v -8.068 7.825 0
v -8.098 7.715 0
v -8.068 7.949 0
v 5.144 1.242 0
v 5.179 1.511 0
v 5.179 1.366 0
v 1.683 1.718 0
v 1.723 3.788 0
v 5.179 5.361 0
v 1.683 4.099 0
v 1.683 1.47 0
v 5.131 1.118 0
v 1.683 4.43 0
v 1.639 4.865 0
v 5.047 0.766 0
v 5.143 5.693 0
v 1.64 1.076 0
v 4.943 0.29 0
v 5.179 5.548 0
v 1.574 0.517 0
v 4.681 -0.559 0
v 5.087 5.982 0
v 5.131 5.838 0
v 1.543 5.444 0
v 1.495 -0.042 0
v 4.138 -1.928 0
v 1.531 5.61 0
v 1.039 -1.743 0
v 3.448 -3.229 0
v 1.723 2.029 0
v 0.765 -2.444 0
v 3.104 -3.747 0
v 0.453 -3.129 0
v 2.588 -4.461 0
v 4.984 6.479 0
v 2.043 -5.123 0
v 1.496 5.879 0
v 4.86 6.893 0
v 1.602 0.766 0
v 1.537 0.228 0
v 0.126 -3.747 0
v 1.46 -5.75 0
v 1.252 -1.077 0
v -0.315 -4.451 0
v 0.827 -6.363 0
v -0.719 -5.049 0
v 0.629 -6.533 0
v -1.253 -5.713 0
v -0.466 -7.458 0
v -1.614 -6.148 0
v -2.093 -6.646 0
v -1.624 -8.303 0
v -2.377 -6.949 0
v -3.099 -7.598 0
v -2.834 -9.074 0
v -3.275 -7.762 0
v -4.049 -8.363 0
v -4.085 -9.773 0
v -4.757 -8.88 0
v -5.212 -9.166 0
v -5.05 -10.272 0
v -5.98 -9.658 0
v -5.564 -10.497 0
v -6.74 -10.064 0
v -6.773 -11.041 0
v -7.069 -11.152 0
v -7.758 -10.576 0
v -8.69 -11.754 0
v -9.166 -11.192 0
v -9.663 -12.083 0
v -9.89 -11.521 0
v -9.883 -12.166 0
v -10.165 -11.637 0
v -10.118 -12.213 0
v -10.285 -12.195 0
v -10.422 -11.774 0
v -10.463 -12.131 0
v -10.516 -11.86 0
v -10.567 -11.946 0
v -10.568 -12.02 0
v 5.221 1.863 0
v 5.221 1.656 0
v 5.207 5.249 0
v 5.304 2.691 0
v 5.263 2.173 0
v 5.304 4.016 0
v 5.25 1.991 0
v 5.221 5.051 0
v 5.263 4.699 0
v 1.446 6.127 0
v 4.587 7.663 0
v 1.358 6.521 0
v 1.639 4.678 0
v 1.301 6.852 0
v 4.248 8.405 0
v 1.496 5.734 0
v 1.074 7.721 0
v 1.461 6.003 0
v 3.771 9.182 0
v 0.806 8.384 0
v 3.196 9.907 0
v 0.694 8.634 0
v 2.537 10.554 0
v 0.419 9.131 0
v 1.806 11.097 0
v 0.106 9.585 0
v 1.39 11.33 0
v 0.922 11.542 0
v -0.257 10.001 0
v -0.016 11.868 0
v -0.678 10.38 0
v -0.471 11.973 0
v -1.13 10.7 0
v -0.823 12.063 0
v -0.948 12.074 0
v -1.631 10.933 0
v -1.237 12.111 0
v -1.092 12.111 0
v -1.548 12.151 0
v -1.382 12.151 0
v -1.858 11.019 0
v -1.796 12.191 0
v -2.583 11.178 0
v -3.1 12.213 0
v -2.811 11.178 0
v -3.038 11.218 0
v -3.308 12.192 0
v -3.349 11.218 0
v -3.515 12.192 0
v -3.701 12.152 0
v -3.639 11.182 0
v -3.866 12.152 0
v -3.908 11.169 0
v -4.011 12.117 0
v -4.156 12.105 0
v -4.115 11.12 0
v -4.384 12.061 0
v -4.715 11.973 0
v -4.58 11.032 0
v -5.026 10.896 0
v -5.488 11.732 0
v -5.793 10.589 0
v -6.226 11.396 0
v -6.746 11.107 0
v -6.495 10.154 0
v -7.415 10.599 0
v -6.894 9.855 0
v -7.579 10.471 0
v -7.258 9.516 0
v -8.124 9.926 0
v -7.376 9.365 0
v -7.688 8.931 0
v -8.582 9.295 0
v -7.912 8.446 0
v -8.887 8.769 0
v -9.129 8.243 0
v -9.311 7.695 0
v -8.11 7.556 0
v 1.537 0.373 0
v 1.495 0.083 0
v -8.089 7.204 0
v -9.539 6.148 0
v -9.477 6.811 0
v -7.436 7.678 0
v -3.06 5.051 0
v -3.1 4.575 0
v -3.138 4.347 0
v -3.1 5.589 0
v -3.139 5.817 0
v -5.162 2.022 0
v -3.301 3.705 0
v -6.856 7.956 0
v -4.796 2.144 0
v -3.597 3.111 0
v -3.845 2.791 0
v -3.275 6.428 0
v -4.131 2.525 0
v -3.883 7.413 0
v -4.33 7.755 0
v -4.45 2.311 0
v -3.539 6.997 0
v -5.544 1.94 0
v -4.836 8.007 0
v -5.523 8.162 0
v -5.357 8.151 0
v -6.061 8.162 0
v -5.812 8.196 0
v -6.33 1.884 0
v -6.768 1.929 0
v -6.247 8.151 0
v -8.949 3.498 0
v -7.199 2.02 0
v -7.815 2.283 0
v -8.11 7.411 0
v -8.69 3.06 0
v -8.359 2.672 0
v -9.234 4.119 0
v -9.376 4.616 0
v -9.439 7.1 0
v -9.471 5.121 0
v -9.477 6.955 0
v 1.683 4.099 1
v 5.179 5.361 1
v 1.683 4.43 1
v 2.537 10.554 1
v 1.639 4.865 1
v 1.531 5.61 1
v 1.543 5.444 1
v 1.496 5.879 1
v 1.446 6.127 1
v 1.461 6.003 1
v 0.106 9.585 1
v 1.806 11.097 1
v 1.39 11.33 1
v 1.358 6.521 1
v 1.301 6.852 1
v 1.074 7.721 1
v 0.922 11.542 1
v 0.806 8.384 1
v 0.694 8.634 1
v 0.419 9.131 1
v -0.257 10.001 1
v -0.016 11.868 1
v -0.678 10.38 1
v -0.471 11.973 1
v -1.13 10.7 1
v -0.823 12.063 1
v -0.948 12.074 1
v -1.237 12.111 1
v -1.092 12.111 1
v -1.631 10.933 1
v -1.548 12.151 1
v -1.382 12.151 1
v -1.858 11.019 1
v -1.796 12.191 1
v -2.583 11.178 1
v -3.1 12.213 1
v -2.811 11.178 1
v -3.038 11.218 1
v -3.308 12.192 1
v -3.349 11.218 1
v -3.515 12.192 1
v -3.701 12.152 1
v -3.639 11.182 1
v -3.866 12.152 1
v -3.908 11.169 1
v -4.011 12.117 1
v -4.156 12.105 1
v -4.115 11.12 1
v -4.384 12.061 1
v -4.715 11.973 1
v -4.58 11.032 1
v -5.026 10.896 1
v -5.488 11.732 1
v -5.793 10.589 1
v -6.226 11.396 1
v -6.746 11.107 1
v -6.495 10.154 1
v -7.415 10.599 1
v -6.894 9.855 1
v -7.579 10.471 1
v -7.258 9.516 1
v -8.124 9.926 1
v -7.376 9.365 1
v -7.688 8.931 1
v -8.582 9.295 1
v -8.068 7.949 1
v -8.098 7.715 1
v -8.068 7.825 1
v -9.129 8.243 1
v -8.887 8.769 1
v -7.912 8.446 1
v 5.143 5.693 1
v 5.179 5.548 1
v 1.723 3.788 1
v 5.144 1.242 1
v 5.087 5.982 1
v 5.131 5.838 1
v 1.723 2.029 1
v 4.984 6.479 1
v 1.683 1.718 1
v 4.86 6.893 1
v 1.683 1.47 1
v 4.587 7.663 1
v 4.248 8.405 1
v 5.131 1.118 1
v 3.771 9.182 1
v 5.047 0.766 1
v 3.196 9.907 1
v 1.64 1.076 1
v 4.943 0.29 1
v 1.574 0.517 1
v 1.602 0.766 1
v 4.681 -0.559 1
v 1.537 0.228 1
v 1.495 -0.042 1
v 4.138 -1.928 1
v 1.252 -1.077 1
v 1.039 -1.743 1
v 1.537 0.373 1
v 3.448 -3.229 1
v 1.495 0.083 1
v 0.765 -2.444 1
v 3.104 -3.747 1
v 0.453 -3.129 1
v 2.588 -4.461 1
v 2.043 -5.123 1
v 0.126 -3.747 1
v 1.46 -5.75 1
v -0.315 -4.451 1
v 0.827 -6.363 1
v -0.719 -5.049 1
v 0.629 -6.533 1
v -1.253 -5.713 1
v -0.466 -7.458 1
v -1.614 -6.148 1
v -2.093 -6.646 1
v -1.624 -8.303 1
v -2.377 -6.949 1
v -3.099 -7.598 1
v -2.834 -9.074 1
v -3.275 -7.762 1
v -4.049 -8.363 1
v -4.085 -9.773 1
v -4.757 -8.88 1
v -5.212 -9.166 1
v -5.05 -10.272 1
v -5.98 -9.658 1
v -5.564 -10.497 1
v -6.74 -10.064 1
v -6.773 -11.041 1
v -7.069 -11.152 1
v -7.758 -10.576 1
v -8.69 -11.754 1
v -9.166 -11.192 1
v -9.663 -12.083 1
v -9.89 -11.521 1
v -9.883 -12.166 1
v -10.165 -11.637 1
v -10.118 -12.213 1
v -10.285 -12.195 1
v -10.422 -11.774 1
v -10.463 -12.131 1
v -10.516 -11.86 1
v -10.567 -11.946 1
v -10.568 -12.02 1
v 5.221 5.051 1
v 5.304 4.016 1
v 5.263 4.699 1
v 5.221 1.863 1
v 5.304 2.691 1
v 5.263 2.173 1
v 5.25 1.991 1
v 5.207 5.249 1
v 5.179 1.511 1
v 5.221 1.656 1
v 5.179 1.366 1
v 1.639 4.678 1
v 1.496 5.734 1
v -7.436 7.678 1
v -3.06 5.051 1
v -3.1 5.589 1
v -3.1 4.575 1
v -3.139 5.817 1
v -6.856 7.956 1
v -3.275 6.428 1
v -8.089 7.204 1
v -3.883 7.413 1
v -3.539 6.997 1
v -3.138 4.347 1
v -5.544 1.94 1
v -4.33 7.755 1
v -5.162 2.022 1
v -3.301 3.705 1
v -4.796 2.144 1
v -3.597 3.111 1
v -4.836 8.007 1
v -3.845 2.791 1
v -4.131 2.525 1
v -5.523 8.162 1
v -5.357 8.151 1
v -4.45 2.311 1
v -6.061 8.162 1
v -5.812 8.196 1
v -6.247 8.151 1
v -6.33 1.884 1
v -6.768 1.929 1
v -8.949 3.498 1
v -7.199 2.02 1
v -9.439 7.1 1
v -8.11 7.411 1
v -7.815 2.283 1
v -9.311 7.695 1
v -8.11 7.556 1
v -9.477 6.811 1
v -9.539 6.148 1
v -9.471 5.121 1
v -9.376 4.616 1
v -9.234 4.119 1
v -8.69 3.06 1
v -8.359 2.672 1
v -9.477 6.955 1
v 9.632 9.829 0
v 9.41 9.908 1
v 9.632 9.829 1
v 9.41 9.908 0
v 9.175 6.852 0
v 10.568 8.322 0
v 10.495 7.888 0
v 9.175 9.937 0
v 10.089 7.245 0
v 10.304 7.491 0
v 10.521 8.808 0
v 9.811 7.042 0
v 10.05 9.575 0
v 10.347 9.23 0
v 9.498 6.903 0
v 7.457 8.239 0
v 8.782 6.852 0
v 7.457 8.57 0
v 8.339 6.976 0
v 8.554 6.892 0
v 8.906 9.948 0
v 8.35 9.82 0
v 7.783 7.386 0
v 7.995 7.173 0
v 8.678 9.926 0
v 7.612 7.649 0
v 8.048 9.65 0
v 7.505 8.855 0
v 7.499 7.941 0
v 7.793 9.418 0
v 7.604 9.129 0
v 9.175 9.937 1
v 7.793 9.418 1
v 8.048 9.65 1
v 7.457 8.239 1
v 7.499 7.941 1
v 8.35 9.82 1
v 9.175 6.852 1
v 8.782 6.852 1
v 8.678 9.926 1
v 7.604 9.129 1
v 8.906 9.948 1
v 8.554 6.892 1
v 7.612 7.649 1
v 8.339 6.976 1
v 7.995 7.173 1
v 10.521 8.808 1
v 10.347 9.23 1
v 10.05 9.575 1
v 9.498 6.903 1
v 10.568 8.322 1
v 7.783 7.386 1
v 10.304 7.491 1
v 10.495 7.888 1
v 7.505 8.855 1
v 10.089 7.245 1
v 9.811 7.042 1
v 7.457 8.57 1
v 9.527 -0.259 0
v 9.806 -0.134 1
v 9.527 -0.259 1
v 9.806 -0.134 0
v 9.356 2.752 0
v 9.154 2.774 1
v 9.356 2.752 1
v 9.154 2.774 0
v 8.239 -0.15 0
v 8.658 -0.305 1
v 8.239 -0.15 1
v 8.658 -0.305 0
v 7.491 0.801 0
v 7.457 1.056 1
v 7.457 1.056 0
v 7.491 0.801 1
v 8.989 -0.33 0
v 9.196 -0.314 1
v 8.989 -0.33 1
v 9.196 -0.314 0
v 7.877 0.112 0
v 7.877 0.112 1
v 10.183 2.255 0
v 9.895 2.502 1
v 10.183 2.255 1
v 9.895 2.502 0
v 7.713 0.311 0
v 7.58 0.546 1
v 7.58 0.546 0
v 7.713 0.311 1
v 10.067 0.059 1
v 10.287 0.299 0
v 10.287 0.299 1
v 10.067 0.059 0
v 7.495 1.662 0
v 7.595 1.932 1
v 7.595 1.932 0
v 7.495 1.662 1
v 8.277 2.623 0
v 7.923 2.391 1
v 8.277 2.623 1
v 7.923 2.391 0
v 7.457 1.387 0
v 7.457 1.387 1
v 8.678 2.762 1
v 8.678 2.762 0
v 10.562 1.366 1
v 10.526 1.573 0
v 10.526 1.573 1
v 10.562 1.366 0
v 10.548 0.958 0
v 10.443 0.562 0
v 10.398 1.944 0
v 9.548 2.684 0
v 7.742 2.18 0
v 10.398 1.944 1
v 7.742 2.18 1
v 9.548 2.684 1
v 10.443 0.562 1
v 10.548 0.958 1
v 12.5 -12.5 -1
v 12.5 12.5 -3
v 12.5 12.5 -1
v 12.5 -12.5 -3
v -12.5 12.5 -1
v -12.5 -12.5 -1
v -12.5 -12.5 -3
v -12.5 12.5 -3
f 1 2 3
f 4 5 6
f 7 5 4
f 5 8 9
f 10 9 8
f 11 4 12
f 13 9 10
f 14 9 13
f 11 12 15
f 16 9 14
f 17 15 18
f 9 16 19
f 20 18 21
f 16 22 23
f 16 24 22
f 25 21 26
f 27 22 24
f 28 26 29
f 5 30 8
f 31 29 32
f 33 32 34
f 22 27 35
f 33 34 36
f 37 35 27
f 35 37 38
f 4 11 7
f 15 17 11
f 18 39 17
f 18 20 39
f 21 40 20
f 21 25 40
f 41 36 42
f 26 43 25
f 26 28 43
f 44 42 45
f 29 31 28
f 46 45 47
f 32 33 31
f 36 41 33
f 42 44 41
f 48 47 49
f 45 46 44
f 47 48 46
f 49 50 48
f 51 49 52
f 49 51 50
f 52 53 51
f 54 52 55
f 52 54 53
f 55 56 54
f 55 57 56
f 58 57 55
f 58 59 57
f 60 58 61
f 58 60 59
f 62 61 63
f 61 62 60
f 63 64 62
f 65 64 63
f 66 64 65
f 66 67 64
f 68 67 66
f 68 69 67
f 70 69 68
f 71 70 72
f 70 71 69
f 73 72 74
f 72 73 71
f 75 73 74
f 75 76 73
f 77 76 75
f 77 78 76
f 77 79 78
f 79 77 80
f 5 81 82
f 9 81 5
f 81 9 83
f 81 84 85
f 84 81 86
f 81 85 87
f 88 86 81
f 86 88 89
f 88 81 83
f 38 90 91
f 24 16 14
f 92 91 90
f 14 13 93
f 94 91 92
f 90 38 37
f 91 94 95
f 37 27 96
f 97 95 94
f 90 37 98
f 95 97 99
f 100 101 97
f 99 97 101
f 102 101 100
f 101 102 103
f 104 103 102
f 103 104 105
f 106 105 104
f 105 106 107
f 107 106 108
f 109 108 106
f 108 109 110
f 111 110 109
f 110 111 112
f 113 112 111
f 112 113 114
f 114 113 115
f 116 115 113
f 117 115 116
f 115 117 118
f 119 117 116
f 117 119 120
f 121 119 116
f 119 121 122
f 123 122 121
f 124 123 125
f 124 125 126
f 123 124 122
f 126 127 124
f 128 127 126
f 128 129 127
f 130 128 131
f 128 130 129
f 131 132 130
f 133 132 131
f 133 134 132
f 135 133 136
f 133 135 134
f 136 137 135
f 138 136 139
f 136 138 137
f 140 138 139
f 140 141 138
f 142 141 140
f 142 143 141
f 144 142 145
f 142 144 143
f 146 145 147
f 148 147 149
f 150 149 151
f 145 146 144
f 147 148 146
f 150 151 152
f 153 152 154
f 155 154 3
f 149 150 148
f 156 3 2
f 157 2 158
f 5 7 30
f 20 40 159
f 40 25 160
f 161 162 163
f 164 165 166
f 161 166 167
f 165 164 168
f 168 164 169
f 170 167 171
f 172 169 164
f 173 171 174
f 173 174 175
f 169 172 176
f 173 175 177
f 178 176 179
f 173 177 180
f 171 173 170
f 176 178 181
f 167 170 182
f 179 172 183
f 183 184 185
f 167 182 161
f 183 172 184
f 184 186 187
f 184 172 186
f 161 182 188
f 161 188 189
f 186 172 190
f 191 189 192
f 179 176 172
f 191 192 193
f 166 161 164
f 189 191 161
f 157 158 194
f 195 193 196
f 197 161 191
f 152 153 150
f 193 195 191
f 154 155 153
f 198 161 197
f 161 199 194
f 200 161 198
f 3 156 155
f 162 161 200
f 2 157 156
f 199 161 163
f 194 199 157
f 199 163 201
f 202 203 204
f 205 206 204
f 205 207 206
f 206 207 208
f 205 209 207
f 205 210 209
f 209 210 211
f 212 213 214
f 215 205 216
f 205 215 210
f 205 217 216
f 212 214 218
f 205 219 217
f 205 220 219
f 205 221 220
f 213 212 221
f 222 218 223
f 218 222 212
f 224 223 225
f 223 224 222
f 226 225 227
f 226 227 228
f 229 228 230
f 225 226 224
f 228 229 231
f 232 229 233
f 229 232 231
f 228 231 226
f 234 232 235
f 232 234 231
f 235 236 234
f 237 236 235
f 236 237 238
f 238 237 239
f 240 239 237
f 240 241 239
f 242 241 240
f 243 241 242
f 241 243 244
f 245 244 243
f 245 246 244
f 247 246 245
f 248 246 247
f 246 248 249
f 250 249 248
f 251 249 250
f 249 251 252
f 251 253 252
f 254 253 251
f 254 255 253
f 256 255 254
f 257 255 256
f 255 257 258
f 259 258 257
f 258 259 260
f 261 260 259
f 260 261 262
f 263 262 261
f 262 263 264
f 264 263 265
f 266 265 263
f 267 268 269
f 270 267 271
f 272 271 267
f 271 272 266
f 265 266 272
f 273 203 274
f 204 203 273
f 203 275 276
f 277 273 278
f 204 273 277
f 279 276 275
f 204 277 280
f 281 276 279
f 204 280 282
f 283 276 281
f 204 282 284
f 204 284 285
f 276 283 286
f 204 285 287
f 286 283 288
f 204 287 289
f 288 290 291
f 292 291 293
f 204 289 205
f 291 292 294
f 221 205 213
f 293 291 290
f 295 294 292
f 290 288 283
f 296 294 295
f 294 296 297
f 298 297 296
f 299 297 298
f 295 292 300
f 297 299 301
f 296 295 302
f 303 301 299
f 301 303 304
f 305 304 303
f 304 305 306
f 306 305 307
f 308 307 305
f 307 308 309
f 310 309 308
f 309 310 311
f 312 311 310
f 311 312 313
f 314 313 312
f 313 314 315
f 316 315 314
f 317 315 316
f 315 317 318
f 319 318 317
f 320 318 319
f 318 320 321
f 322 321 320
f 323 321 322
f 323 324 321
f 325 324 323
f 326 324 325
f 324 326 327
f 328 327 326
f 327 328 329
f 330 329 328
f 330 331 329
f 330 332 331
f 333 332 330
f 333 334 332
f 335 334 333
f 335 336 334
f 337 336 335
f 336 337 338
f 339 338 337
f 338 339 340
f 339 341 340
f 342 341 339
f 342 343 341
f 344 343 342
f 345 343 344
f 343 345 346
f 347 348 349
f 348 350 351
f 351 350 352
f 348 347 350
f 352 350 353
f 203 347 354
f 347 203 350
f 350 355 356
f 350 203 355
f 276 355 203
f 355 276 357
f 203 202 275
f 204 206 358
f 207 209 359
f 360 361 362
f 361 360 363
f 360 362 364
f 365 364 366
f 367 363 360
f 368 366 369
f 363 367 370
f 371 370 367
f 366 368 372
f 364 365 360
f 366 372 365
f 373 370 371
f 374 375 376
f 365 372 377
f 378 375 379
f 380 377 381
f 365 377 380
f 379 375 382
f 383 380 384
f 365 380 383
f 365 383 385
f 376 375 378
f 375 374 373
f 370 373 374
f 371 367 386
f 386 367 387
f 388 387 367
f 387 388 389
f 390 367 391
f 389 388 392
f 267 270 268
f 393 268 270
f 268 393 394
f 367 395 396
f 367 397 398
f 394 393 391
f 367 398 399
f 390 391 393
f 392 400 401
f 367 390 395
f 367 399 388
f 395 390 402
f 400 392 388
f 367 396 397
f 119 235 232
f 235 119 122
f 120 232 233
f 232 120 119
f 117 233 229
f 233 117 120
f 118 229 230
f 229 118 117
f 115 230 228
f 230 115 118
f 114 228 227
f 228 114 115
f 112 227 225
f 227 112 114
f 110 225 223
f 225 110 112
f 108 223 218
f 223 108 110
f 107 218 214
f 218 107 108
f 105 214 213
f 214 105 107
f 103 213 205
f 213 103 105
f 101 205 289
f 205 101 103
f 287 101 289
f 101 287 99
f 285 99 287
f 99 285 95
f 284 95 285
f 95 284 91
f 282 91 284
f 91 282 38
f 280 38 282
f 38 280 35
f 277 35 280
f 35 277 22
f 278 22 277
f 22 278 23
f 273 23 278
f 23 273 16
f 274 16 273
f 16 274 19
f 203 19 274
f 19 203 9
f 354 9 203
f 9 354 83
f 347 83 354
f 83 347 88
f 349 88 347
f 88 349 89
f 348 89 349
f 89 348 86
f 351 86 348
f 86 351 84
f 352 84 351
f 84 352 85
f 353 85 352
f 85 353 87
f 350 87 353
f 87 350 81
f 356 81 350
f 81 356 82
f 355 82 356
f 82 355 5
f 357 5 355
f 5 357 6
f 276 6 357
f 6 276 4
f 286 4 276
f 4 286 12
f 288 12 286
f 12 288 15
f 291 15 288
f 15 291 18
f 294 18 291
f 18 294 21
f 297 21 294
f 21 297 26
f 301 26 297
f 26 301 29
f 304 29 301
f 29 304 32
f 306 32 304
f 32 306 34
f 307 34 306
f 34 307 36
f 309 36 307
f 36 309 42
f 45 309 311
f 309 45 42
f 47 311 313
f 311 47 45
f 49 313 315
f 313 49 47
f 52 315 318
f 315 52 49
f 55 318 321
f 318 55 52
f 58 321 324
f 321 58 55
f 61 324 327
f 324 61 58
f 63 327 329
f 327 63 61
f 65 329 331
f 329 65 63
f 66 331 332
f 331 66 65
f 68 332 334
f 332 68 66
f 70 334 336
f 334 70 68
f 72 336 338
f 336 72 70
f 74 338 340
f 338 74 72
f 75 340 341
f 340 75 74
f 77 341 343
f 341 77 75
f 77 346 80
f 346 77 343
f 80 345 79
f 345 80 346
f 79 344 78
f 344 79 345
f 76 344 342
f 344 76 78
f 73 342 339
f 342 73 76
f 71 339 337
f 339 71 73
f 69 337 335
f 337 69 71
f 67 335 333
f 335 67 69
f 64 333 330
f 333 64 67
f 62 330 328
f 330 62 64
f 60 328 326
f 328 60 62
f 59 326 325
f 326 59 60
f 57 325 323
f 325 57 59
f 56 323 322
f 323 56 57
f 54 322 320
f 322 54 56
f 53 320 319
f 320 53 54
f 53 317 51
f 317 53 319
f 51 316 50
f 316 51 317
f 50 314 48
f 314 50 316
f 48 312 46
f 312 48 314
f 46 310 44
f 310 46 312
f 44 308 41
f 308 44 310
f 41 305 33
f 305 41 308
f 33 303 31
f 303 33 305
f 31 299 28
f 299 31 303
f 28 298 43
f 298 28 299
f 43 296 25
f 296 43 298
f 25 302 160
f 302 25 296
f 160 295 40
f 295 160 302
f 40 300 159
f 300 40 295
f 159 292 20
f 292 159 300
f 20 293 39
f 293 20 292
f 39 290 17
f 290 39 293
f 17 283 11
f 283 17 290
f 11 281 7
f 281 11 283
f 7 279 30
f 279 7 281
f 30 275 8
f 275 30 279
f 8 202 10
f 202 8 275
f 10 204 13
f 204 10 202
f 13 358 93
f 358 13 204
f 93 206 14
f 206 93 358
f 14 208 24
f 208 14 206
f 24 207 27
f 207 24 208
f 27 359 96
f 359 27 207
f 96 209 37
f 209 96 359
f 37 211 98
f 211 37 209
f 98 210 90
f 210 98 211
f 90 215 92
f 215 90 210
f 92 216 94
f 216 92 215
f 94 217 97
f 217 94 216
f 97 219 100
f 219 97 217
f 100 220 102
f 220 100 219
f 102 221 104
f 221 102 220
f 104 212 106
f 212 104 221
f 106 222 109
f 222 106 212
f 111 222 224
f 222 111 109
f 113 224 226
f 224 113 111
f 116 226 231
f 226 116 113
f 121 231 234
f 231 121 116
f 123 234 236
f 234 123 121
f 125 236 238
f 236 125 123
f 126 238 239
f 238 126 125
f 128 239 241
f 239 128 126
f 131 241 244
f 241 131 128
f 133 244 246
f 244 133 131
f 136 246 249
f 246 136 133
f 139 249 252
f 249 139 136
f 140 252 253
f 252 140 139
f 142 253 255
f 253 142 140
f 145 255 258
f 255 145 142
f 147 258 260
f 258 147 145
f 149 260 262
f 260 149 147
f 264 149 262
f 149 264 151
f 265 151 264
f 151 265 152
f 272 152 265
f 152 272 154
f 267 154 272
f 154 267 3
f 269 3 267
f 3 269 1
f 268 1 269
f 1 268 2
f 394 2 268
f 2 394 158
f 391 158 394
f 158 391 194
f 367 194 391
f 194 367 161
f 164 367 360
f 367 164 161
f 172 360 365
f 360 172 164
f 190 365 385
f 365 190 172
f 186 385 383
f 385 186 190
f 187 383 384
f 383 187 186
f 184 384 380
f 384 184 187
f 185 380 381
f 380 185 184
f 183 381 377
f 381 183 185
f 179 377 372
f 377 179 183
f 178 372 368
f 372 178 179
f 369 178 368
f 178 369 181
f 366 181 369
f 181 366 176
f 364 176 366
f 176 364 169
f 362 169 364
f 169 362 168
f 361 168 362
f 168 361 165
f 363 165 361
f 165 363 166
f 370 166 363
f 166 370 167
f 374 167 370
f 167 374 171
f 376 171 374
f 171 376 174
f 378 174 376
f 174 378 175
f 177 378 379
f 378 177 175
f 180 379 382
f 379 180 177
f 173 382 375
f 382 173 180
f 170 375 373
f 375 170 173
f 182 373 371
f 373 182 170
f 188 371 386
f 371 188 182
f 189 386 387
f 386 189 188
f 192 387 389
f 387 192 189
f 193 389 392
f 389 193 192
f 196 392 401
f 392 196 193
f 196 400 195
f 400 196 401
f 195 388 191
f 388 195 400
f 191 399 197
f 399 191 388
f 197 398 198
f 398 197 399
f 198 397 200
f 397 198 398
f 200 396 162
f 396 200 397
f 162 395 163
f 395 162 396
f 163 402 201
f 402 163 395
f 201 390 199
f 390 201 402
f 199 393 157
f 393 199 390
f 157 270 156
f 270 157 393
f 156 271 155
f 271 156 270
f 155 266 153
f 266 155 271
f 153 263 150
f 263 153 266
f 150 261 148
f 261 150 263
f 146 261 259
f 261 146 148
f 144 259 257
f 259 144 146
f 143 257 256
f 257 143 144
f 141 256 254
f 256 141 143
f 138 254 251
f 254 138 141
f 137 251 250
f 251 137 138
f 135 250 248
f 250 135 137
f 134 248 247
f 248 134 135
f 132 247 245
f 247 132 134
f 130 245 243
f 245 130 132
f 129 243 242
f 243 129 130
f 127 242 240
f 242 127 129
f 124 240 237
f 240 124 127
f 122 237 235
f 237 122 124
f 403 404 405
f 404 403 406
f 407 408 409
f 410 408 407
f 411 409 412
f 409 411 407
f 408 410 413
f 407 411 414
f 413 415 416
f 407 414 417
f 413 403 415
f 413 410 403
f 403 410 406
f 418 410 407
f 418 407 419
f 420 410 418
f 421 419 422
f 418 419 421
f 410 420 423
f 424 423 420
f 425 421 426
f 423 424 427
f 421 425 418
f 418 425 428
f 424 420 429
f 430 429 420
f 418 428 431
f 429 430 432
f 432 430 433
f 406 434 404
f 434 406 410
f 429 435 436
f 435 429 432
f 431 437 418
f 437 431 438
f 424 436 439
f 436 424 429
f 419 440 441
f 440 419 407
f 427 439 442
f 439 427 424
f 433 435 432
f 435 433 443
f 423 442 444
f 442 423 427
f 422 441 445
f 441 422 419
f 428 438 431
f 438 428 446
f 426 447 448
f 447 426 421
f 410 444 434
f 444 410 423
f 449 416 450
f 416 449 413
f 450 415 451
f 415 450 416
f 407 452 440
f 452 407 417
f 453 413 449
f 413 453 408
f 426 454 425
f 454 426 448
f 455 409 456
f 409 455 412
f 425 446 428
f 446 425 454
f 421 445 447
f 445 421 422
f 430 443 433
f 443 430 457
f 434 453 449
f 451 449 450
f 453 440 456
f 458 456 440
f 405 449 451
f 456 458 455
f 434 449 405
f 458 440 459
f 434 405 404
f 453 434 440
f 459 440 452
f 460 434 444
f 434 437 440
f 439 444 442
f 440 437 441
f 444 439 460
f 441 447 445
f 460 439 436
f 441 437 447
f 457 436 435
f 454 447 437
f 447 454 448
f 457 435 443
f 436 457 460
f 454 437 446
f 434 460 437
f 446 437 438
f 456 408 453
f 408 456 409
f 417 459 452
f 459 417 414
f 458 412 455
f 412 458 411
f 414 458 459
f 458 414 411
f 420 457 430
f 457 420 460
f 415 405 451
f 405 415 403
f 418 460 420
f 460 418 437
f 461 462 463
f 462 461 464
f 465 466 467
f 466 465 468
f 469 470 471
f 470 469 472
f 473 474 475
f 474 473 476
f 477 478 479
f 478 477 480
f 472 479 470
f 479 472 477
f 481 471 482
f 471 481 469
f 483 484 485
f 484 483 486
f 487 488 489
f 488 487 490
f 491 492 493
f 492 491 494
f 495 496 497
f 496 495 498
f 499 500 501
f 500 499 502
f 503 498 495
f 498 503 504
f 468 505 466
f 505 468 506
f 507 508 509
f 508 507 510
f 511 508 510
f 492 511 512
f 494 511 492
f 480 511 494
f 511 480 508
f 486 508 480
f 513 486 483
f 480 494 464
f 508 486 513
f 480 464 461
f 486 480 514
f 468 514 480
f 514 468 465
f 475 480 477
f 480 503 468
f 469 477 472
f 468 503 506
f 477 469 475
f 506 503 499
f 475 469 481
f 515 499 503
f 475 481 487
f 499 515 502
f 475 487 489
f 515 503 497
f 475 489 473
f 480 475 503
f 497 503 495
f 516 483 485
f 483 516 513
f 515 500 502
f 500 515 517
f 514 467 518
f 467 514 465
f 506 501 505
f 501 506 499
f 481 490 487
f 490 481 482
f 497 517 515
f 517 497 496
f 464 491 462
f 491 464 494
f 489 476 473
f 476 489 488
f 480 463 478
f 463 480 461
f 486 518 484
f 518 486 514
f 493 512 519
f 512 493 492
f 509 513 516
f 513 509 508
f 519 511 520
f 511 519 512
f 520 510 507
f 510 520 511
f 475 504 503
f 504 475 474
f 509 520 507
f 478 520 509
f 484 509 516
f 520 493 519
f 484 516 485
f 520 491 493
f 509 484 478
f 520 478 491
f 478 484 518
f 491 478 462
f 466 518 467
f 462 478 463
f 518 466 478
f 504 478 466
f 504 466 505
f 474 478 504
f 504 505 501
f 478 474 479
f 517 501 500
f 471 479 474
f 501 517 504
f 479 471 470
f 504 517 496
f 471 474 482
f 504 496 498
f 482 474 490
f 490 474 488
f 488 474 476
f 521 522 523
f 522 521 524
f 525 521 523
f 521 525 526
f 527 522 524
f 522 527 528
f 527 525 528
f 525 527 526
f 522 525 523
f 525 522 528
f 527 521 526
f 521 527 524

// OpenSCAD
// file: bass-clef.scad
// Module names are of the form poly_<inkscape-path-id>().  As a result,
// you can associate a polygon in this OpenSCAD program with the corresponding
// SVG element in the Inkscape document by looking for the XML element with
// the attribute id="inkscape-path-id".

// fudge value is used to ensure that subtracted solids are a tad taller
// in the z dimension than the polygon being subtracted from.  This helps
// keep the resulting .stl file manifold.
fudge = 0.1;

/**
 * this is the bass clef scalled down to 15% of the original
 */
module bassClef(h=1)
{
  scale([25.4/90, -25.4/90, 1]) union()
  {
    linear_extrude(height=h)
      polygon([[-53.879273,-55.635750],[-49.678523,-57.651750],[-45.266273,-59.060250],[-43.916273,-59.142750],[-42.116273,-59.387250],[-40.016273,-59.141250],[-38.816273,-59.060250],[-35.041594,-58.017938],[-31.373086,-56.193750],[-28.132922,-53.712563],[-25.643273,-50.699250],[-23.732648,-46.578375],[-22.746773,-42.149250],[-22.466273,-40.499250],[-22.169273,-36.599250],[-22.466273,-33.149250],[-22.734773,-31.499250],[-23.921461,-26.847000],[-26.063273,-22.541250],[-27.860599,-20.221860],[-29.935219,-18.298102],[-32.245351,-16.744714],[-34.749211,-15.536438],[-37.405017,-14.648013],[-40.170984,-14.054180],[-45.866273,-13.649250],[-49.038211,-13.977750],[-52.166273,-14.634750],[-56.627273,-16.542000],[-60.566273,-19.362750],[-62.965898,-22.170938],[-64.845773,-25.349250],[-66.906773,-29.849250],[-67.938398,-33.444234],[-68.623523,-37.107000],[-69.116273,-44.549250],[-68.672273,-49.349250],[-68.672273,-50.399250],[-68.394773,-51.449250],[-67.468758,-55.755070],[-66.147023,-59.731688],[-64.396664,-63.542086],[-62.184773,-67.349250],[-58.863773,-71.924250],[-54.917273,-75.872250],[-53.729273,-76.800750],[-48.884273,-80.480250],[-45.116273,-82.575750],[-39.767836,-85.007250],[-34.166273,-86.754750],[-31.766273,-87.393750],[-30.116273,-87.710250],[-29.066273,-87.797250],[-28.016273,-88.056750],[-26.816273,-88.056750],[-25.466273,-88.343250],[-23.966273,-88.343250],[-22.466273,-88.499250],[-13.016273,-88.335750],[-11.216273,-88.046250],[-10.016273,-88.046250],[-8.966273,-87.755250],[-7.916273,-87.755250],[-6.866273,-87.488250],[-5.966273,-87.410250],[-3.416273,-86.756250],[-0.116273,-85.992750],[6.681914,-83.633625],[10.069266,-82.097156],[13.085227,-80.412750],[18.385805,-76.472977],[23.161852,-71.784937],[27.323086,-66.532430],[30.779227,-60.899250],[33.239414,-55.528312],[35.214727,-49.949250],[36.116227,-46.949250],[36.863227,-43.349250],[37.176727,-42.299250],[37.265227,-41.249250],[37.527727,-40.199250],[37.527727,-38.849250],[37.726852,-38.037000],[37.833727,-36.599250],[38.133727,-34.049250],[38.433727,-29.099250],[38.433727,-19.499250],[38.133727,-15.749250],[38.041477,-14.423437],[37.832227,-13.499250],[37.832227,-11.999250],[37.530727,-10.949250],[37.530727,-9.899250],[37.272727,-8.999250],[37.178227,-8.099250],[36.572227,-5.549250],[35.817727,-2.099250],[33.915727,4.050750],[29.984977,13.970438],[24.983227,23.400750],[22.493227,27.150750],[18.755109,32.327648],[14.807039,37.119937],[10.576312,41.667258],[5.990227,46.109250],[4.559227,47.337750],[-3.378047,54.038203],[-11.767711,60.166875],[-20.534531,65.750484],[-29.603273,70.815750],[-36.591773,74.433750],[-40.316273,76.064250],[-49.079273,80.001750],[-51.224273,80.804250],[-62.966273,85.167750],[-70.016273,87.557250],[-71.610023,88.156500],[-73.316273,88.499250],[-74.524008,88.363430],[-75.811898,87.900938],[-76.572727,87.096727],[-76.565736,86.561774],[-76.199273,85.935750],[-75.521273,85.313250],[-73.657898,84.321188],[-71.666273,83.478750],[-66.416273,81.095250],[-56.216273,76.634250],[-48.836273,72.926250],[-43.329773,69.981750],[-37.767773,66.417750],[-34.466273,64.344750],[-29.340773,60.600750],[-23.730773,56.244750],[-22.458773,55.052250],[-17.222273,50.349750],[-15.168773,48.156750],[-11.691773,44.550750],[-9.078773,41.399250],[-5.213273,36.587250],[-2.285273,32.250750],[0.912727,27.150750],[3.285656,22.670156],[5.544539,17.708625],[7.527516,12.630656],[9.072727,7.800750],[10.830727,0.300750],[10.830727,-0.599250],[11.133727,-1.649250],[11.133727,-2.699250],[11.408227,-3.749250],[11.610727,-5.549250],[11.883727,-7.799250],[12.197227,-10.649250],[12.197227,-12.449250],[12.483727,-14.699250],[12.483727,-27.449250],[12.195727,-29.699250],[12.195727,-32.099250],[11.879227,-33.899250],[11.879227,-35.249250],[11.181727,-39.449250],[11.094727,-40.649250],[10.836727,-41.549250],[10.836727,-42.599250],[10.589227,-43.499250],[10.478227,-44.399250],[9.839227,-47.249250],[9.428227,-49.649250],[7.781227,-55.949250],[5.837227,-60.749250],[5.028727,-62.562750],[3.038812,-66.165844],[0.767789,-69.456750],[-1.859016,-72.464156],[-4.916273,-75.216750],[-8.188523,-77.533687],[-11.816273,-79.221750],[-13.466273,-79.842750],[-18.716273,-80.999250],[-20.366273,-80.999250],[-22.016273,-81.285750],[-24.266273,-81.285750],[-26.366273,-81.024750],[-28.316273,-80.930250],[-29.816273,-80.576250],[-33.188273,-79.936125],[-36.416273,-78.951750],[-41.974711,-76.728187],[-47.066273,-73.578750],[-49.952086,-71.410875],[-52.593773,-68.952750],[-53.447273,-67.862250],[-55.706086,-64.713000],[-57.329273,-61.199250],[-58.463273,-57.599250],[-58.463273,-56.699250],[-58.677773,-55.902562],[-58.766273,-54.749250],[-58.766273,-53.699250],[-58.616273,-52.199250],[-53.879273,-55.635750]]);
    linear_extrude(height=h)
      polygon([[66.483727,-72.005250],[68.183789,-71.796375],[69.797227,-71.220750],[72.819727,-69.378844],[74.975977,-66.879375],[76.236727,-63.820219],[76.572727,-60.299250],[76.046039,-57.155813],[74.663227,-54.281250],[73.105477,-52.499016],[71.092102,-51.025875],[68.819414,-50.022422],[66.483727,-49.649250],[63.633727,-49.649250],[61.985227,-49.936125],[60.422227,-50.544750],[57.933727,-51.977250],[56.394117,-53.517938],[55.157977,-55.426500],[54.334711,-57.540938],[54.033727,-59.699250],[54.033727,-62.099250],[54.380414,-64.165313],[55.097227,-66.149250],[56.467852,-68.241023],[58.316602,-69.921188],[60.502289,-71.158383],[62.883727,-71.921250],[64.533727,-72.086250],[66.483727,-72.005250]]);
    linear_extrude(height=h)
      polygon([[66.333727,-20.099250],[67.796414,-19.941750],[69.183727,-19.445250],[71.702930,-18.132797],[73.788727,-16.340250],[75.343523,-14.088703],[76.269727,-11.399250],[76.533727,-9.899250],[76.432664,-6.941438],[75.666727,-4.074750],[74.536453,-2.163844],[72.945914,-0.429000],[71.057531,0.971719],[69.033727,1.880250],[66.633727,2.276250],[65.133727,2.394750],[62.733727,2.211750],[59.699039,1.090500],[57.077227,-0.813750],[55.890188,-2.251781],[54.926039,-3.959250],[54.276609,-5.802844],[54.033727,-7.649250],[54.033727,-10.049250],[54.311344,-12.041531],[55.031789,-13.997250],[56.097328,-15.797719],[57.410227,-17.324250],[59.976539,-19.003875],[62.883727,-20.010750],[66.333727,-20.099250]]);
  }
}

module bassClefThumbnail()
{
	xyScale = 0.489;
	scale([xyScale, xyScale, 1])
	bassClef(h=1);	
}
// file: ../../../thumbnail-background.scad
module thumbnailBackground()
{
	color("green")
	translate([0, 0, -2])
	cube([25, 25, 2], center=true);	
}
// main file
use <../../../thumbnail-background.scad>
use <bass-clef.scad>

//scale([1,1,1])
bassClefThumbnail();

thumbnailBackground();
